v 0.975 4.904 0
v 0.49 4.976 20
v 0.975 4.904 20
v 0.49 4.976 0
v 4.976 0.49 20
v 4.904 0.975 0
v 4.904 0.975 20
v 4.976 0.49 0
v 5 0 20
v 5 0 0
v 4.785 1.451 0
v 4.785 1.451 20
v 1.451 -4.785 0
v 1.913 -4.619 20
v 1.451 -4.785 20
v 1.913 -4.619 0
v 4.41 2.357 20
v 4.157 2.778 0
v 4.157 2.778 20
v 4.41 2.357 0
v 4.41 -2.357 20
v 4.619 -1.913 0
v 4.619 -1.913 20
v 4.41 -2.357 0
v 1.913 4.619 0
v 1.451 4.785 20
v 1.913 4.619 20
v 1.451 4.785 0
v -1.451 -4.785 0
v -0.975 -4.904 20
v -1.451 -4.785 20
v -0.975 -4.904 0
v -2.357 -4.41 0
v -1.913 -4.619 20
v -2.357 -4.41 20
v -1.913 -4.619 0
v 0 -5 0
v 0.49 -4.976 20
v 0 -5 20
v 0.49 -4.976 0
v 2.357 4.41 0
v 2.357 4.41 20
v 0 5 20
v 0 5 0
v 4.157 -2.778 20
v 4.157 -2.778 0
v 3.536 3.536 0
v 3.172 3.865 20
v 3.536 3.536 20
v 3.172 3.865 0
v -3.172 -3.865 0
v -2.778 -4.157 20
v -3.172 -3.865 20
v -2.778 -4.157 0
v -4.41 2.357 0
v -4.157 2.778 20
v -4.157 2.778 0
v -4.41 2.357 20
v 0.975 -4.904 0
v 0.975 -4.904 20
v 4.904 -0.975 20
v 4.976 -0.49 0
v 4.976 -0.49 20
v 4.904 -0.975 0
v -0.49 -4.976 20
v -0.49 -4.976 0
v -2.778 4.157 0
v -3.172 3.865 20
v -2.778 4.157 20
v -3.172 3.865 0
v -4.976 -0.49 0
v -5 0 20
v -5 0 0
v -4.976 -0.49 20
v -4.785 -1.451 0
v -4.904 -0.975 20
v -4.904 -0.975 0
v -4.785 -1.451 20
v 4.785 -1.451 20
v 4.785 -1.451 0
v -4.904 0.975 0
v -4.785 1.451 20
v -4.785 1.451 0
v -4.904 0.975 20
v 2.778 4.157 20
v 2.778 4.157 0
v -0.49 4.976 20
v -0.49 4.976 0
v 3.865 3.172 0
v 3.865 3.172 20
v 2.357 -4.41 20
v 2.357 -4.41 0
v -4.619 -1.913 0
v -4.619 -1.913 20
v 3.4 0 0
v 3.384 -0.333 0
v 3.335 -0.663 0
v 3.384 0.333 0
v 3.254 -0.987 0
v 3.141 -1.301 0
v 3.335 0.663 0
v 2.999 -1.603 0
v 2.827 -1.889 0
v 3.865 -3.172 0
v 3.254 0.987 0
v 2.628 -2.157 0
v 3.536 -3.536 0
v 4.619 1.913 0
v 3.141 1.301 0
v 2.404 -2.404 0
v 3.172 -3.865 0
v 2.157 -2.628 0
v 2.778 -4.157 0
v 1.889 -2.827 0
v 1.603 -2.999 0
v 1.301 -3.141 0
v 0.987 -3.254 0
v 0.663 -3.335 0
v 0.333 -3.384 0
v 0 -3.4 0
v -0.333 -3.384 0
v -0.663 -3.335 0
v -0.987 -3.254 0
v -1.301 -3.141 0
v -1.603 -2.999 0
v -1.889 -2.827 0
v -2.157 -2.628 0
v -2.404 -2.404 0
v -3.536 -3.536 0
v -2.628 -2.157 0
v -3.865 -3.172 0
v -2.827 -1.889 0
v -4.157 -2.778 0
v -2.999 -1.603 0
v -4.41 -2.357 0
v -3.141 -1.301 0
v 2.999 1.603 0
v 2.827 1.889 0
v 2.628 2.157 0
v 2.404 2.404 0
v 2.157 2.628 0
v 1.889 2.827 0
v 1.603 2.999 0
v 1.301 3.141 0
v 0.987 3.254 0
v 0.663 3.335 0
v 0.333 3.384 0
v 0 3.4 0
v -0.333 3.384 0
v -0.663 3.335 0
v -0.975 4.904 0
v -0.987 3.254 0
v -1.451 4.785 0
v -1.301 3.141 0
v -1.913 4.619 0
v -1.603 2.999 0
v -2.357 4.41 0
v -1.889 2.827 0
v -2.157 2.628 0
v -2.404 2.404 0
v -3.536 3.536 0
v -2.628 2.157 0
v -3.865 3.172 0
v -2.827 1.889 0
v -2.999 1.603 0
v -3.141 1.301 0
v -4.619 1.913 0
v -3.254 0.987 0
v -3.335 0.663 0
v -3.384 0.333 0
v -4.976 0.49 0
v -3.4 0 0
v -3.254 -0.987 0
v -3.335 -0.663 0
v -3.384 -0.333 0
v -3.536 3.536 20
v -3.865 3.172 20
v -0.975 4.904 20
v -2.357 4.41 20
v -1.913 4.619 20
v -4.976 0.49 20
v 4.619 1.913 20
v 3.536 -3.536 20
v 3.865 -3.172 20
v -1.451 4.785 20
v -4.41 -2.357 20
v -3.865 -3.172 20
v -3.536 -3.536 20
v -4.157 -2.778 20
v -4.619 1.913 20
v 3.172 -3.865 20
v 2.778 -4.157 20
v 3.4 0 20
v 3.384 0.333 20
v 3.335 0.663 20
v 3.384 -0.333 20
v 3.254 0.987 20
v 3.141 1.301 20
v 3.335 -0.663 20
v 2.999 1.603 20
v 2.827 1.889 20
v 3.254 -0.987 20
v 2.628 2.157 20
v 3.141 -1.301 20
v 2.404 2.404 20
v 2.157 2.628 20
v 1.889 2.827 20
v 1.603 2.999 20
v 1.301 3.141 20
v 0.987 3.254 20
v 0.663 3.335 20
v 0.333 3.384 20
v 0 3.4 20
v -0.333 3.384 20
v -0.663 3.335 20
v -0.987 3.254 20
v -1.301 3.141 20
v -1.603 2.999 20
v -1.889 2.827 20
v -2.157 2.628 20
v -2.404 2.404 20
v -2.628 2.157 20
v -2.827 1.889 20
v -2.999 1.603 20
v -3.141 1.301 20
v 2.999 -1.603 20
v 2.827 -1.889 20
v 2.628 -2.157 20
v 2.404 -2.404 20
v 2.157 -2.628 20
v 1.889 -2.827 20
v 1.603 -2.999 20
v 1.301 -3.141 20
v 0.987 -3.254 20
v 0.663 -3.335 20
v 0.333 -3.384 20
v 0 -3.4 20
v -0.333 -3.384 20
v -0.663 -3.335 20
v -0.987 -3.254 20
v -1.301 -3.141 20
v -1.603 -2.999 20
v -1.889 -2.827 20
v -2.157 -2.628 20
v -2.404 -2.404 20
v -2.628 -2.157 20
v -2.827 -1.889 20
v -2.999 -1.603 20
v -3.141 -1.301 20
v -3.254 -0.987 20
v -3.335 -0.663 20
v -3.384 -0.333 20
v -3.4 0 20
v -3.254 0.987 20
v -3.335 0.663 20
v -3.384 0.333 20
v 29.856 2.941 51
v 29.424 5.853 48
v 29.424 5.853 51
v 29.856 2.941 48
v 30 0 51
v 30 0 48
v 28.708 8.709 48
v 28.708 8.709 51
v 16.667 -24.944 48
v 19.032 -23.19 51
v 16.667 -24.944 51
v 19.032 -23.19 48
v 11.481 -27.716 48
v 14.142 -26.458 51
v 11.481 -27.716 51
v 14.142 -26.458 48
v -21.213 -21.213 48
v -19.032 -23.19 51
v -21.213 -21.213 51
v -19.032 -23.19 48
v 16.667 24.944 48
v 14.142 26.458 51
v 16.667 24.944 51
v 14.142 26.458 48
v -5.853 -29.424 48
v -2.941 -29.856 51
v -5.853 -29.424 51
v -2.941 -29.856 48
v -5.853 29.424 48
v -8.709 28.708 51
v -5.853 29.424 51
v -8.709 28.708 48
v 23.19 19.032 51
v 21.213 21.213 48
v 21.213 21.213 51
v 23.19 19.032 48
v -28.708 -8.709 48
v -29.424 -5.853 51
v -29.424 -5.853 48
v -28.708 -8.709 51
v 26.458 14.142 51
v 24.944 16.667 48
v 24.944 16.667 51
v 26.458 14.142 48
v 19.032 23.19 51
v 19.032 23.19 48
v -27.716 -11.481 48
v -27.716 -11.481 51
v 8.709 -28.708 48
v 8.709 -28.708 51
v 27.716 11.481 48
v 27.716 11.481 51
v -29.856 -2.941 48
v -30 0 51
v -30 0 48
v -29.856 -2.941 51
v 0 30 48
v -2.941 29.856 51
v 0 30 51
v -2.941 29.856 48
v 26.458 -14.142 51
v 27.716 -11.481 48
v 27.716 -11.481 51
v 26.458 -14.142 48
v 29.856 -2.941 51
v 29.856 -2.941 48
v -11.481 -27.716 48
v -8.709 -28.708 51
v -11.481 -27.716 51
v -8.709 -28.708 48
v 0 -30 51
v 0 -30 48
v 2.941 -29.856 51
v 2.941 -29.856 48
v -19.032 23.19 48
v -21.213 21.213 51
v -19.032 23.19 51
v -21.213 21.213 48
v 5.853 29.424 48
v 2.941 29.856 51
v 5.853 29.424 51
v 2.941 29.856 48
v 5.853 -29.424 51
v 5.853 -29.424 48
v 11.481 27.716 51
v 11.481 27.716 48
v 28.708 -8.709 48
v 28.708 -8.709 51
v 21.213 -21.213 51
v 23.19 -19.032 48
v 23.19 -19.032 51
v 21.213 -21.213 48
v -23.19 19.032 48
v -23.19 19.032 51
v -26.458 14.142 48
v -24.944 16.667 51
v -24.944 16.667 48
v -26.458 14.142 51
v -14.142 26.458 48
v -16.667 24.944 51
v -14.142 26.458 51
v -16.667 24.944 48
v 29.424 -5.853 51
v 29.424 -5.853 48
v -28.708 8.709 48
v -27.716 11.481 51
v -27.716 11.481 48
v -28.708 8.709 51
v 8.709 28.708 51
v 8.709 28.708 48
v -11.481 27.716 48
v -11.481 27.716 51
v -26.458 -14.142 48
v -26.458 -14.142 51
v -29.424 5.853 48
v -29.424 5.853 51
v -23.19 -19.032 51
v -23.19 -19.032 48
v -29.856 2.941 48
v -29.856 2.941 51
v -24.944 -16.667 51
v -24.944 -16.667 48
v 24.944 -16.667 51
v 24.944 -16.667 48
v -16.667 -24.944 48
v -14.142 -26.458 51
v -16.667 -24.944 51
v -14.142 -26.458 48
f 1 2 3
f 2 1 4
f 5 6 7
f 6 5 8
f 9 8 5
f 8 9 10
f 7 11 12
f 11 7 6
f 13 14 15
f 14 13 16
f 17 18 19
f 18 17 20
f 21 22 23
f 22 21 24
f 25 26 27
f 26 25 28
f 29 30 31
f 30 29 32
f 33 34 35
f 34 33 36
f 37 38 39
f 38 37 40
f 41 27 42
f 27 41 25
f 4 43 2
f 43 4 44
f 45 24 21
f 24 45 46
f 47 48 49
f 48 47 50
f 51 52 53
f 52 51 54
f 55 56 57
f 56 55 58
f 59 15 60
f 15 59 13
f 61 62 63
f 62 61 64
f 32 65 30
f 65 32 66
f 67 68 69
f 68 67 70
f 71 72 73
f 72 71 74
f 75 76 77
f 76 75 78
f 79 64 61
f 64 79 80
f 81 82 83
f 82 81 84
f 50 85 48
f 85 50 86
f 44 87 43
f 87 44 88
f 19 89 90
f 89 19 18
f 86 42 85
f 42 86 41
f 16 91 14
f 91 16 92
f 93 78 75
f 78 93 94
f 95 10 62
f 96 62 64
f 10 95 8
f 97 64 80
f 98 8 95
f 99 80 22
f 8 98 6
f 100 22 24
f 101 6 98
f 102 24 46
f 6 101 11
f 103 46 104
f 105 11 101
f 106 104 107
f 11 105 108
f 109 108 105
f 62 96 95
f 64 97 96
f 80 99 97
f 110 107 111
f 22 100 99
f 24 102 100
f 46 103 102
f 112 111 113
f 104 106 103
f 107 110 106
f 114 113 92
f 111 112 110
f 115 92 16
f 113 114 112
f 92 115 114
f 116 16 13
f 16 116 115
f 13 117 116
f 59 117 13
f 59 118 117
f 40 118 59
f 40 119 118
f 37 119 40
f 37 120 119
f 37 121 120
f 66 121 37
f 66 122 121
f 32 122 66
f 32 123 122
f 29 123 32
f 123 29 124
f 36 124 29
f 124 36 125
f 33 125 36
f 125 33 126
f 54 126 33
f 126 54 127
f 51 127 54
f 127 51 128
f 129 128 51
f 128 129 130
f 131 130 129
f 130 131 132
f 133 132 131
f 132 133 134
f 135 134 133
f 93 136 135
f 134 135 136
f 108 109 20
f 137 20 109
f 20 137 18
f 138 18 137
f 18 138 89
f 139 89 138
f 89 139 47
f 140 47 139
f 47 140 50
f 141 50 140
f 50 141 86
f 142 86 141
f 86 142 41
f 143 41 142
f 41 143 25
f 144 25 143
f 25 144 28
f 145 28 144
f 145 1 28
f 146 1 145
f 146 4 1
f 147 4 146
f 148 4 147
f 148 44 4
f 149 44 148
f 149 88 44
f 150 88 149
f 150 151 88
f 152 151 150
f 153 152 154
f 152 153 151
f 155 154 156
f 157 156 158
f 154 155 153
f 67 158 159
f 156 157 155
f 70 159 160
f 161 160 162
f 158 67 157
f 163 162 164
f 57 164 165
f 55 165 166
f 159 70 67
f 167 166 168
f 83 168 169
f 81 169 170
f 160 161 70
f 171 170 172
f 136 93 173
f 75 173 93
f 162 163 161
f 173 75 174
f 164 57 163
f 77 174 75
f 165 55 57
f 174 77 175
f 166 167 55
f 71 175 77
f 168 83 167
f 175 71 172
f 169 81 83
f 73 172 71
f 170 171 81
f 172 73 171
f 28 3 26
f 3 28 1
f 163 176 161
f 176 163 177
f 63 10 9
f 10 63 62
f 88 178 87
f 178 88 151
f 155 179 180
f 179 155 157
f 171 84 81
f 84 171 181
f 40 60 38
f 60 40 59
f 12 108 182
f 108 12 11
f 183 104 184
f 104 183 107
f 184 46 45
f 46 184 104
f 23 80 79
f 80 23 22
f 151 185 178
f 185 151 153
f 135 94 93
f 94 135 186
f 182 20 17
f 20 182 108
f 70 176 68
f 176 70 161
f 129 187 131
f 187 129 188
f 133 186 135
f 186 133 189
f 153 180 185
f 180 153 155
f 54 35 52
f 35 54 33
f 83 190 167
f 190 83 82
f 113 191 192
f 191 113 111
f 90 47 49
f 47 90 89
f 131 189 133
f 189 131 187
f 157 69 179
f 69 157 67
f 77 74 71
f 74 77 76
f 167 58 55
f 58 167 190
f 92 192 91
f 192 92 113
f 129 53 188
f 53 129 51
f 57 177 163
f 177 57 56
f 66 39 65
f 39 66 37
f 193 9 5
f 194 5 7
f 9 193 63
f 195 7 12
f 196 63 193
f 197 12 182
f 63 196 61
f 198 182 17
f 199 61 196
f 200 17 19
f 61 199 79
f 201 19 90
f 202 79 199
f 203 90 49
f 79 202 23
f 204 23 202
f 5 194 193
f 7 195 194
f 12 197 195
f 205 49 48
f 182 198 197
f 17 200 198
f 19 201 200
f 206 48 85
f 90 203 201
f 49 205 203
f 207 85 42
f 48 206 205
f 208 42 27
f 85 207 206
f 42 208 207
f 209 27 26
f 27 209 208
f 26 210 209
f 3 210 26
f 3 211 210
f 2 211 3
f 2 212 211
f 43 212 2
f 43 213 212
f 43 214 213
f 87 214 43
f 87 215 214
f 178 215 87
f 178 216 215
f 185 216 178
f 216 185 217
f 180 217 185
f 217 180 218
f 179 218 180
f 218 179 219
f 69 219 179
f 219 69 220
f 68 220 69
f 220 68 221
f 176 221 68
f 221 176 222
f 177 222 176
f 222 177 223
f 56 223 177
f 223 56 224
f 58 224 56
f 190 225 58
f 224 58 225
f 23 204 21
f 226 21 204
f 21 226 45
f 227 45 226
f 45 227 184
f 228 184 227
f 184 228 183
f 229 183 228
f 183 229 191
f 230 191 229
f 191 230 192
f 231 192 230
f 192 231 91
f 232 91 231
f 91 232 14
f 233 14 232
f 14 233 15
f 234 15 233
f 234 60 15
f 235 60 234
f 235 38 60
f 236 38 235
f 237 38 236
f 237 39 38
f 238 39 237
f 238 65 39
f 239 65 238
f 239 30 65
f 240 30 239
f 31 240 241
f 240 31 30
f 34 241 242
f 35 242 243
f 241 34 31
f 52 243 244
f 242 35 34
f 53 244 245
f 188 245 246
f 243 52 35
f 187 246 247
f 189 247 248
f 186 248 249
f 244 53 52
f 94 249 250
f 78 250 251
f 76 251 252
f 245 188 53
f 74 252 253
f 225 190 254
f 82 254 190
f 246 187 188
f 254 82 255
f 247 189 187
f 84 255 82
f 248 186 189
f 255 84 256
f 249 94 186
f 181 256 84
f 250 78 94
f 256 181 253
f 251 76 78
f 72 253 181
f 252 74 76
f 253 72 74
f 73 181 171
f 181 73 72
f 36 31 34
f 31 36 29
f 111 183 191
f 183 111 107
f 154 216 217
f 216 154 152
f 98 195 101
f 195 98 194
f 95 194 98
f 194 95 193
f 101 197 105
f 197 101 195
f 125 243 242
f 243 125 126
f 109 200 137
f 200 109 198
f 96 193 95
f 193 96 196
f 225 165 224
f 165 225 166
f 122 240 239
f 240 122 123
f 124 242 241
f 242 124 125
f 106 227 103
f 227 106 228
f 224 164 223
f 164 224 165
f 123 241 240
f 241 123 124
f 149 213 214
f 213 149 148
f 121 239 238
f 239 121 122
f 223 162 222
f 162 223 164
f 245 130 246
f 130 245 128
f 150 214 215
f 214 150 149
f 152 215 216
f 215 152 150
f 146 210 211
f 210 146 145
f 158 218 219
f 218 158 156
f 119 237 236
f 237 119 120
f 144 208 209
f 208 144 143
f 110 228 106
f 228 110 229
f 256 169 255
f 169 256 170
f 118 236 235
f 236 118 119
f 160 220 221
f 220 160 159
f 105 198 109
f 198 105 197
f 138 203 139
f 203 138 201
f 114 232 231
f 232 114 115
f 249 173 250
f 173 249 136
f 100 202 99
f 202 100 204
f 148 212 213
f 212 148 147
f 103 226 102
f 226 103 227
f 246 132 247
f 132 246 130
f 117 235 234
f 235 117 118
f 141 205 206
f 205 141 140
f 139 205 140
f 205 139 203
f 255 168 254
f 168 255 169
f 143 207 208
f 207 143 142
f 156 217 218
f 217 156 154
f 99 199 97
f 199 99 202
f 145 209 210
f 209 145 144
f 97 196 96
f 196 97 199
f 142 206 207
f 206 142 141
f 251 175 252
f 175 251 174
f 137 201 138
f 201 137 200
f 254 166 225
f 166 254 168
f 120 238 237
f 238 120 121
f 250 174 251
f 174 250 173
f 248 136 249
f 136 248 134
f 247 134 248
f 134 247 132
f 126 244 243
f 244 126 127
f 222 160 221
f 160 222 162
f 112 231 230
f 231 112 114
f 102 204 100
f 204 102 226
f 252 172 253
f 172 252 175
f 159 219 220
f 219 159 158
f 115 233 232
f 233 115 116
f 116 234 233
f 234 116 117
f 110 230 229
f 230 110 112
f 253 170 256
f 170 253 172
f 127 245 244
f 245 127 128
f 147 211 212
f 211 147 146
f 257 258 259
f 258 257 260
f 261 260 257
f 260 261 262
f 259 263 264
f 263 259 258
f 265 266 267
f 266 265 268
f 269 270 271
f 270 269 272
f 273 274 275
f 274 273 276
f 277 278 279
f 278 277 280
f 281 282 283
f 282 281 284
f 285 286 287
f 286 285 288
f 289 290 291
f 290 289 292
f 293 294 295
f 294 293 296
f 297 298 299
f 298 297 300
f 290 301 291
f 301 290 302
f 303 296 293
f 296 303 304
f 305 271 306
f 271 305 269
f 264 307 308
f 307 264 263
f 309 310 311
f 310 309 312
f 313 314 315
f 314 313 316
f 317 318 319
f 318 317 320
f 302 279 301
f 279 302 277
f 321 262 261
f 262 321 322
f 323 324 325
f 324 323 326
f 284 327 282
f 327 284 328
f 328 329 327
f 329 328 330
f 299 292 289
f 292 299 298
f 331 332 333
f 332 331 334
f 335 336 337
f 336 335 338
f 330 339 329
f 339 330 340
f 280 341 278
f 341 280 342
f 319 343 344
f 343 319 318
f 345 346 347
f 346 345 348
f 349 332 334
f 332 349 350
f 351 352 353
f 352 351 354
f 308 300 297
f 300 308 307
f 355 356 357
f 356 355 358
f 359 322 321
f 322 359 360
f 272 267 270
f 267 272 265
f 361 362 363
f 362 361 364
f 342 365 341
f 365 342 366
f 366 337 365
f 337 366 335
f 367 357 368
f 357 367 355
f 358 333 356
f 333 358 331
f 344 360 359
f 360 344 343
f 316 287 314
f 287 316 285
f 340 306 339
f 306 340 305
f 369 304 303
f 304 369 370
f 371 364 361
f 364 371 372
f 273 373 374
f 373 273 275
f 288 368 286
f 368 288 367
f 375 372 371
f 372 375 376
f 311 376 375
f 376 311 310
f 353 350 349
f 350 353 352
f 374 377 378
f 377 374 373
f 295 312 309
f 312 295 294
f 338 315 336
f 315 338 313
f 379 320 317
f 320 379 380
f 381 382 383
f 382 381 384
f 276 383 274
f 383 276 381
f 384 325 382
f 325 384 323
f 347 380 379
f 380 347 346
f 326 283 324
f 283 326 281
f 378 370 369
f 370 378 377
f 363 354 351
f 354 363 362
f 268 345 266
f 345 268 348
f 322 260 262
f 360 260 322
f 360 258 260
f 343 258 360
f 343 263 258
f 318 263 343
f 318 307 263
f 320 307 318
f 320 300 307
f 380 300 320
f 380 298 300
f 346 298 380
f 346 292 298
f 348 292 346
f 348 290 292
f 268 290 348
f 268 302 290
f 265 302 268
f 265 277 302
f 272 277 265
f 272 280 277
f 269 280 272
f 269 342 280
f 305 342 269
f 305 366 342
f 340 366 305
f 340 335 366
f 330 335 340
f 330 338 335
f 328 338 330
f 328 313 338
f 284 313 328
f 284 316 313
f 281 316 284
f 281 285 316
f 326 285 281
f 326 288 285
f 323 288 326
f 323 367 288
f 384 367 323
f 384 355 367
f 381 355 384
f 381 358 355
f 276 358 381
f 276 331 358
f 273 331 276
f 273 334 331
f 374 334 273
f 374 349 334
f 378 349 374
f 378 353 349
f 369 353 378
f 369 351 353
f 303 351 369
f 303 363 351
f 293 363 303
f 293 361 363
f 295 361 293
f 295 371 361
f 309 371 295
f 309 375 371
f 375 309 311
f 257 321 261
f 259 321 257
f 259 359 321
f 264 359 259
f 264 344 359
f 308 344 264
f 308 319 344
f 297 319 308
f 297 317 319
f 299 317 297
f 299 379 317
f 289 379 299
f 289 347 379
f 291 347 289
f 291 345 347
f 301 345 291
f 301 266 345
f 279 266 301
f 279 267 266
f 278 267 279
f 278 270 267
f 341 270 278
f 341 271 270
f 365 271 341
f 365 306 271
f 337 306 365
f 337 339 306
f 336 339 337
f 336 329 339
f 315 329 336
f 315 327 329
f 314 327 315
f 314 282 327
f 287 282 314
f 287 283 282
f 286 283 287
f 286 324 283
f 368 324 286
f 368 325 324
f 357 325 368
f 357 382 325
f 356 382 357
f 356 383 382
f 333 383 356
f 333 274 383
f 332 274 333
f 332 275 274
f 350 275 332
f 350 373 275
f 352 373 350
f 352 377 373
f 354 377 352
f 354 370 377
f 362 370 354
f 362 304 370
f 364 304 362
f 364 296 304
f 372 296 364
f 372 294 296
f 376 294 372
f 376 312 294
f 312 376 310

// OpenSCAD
// Lab funnel - printed upright, open at top and bottom
// Units: mm

$fn = 64;

// Spout (tube)
spout_od    = 10;   // outer diameter of spout
spout_id    = spout_od - 2 * 1.6;  // bore diameter (1.6 mm wall)
spout_h     = 20;   // spout height (z = 0 to 20)

// Cone
cone_od_top = 60;   // rim outer diameter (z = 50)
cone_od_bot = spout_od; // cone starts at spout diameter (z = 20)
cone_h      = 30;   // cone height (z = 20 to 50)

// Cut overshoot
eps = 0.5;          // extension past cut faces

union() {
    // Spout body
    difference() {
        cylinder(d = spout_od, h = spout_h);
        translate([0, 0, -eps])
            cylinder(d = spout_id, h = spout_h + 2 * eps);
    }

    // Cone (slightly overlapping the spout for a clean union)
    translate([0, 0, spout_h - 0.01])
        linear_extrude(height = cone_h + 0.01)
            polygon([
                [0, cone_od_bot / 2],
                [cone_od_top / 2, cone_h]
            ]);

    // Top rim thickened for strength
    translate([0, 0, spout_h + cone_h - 2])
        cylinder(d = cone_od_top, h = 3);
}
